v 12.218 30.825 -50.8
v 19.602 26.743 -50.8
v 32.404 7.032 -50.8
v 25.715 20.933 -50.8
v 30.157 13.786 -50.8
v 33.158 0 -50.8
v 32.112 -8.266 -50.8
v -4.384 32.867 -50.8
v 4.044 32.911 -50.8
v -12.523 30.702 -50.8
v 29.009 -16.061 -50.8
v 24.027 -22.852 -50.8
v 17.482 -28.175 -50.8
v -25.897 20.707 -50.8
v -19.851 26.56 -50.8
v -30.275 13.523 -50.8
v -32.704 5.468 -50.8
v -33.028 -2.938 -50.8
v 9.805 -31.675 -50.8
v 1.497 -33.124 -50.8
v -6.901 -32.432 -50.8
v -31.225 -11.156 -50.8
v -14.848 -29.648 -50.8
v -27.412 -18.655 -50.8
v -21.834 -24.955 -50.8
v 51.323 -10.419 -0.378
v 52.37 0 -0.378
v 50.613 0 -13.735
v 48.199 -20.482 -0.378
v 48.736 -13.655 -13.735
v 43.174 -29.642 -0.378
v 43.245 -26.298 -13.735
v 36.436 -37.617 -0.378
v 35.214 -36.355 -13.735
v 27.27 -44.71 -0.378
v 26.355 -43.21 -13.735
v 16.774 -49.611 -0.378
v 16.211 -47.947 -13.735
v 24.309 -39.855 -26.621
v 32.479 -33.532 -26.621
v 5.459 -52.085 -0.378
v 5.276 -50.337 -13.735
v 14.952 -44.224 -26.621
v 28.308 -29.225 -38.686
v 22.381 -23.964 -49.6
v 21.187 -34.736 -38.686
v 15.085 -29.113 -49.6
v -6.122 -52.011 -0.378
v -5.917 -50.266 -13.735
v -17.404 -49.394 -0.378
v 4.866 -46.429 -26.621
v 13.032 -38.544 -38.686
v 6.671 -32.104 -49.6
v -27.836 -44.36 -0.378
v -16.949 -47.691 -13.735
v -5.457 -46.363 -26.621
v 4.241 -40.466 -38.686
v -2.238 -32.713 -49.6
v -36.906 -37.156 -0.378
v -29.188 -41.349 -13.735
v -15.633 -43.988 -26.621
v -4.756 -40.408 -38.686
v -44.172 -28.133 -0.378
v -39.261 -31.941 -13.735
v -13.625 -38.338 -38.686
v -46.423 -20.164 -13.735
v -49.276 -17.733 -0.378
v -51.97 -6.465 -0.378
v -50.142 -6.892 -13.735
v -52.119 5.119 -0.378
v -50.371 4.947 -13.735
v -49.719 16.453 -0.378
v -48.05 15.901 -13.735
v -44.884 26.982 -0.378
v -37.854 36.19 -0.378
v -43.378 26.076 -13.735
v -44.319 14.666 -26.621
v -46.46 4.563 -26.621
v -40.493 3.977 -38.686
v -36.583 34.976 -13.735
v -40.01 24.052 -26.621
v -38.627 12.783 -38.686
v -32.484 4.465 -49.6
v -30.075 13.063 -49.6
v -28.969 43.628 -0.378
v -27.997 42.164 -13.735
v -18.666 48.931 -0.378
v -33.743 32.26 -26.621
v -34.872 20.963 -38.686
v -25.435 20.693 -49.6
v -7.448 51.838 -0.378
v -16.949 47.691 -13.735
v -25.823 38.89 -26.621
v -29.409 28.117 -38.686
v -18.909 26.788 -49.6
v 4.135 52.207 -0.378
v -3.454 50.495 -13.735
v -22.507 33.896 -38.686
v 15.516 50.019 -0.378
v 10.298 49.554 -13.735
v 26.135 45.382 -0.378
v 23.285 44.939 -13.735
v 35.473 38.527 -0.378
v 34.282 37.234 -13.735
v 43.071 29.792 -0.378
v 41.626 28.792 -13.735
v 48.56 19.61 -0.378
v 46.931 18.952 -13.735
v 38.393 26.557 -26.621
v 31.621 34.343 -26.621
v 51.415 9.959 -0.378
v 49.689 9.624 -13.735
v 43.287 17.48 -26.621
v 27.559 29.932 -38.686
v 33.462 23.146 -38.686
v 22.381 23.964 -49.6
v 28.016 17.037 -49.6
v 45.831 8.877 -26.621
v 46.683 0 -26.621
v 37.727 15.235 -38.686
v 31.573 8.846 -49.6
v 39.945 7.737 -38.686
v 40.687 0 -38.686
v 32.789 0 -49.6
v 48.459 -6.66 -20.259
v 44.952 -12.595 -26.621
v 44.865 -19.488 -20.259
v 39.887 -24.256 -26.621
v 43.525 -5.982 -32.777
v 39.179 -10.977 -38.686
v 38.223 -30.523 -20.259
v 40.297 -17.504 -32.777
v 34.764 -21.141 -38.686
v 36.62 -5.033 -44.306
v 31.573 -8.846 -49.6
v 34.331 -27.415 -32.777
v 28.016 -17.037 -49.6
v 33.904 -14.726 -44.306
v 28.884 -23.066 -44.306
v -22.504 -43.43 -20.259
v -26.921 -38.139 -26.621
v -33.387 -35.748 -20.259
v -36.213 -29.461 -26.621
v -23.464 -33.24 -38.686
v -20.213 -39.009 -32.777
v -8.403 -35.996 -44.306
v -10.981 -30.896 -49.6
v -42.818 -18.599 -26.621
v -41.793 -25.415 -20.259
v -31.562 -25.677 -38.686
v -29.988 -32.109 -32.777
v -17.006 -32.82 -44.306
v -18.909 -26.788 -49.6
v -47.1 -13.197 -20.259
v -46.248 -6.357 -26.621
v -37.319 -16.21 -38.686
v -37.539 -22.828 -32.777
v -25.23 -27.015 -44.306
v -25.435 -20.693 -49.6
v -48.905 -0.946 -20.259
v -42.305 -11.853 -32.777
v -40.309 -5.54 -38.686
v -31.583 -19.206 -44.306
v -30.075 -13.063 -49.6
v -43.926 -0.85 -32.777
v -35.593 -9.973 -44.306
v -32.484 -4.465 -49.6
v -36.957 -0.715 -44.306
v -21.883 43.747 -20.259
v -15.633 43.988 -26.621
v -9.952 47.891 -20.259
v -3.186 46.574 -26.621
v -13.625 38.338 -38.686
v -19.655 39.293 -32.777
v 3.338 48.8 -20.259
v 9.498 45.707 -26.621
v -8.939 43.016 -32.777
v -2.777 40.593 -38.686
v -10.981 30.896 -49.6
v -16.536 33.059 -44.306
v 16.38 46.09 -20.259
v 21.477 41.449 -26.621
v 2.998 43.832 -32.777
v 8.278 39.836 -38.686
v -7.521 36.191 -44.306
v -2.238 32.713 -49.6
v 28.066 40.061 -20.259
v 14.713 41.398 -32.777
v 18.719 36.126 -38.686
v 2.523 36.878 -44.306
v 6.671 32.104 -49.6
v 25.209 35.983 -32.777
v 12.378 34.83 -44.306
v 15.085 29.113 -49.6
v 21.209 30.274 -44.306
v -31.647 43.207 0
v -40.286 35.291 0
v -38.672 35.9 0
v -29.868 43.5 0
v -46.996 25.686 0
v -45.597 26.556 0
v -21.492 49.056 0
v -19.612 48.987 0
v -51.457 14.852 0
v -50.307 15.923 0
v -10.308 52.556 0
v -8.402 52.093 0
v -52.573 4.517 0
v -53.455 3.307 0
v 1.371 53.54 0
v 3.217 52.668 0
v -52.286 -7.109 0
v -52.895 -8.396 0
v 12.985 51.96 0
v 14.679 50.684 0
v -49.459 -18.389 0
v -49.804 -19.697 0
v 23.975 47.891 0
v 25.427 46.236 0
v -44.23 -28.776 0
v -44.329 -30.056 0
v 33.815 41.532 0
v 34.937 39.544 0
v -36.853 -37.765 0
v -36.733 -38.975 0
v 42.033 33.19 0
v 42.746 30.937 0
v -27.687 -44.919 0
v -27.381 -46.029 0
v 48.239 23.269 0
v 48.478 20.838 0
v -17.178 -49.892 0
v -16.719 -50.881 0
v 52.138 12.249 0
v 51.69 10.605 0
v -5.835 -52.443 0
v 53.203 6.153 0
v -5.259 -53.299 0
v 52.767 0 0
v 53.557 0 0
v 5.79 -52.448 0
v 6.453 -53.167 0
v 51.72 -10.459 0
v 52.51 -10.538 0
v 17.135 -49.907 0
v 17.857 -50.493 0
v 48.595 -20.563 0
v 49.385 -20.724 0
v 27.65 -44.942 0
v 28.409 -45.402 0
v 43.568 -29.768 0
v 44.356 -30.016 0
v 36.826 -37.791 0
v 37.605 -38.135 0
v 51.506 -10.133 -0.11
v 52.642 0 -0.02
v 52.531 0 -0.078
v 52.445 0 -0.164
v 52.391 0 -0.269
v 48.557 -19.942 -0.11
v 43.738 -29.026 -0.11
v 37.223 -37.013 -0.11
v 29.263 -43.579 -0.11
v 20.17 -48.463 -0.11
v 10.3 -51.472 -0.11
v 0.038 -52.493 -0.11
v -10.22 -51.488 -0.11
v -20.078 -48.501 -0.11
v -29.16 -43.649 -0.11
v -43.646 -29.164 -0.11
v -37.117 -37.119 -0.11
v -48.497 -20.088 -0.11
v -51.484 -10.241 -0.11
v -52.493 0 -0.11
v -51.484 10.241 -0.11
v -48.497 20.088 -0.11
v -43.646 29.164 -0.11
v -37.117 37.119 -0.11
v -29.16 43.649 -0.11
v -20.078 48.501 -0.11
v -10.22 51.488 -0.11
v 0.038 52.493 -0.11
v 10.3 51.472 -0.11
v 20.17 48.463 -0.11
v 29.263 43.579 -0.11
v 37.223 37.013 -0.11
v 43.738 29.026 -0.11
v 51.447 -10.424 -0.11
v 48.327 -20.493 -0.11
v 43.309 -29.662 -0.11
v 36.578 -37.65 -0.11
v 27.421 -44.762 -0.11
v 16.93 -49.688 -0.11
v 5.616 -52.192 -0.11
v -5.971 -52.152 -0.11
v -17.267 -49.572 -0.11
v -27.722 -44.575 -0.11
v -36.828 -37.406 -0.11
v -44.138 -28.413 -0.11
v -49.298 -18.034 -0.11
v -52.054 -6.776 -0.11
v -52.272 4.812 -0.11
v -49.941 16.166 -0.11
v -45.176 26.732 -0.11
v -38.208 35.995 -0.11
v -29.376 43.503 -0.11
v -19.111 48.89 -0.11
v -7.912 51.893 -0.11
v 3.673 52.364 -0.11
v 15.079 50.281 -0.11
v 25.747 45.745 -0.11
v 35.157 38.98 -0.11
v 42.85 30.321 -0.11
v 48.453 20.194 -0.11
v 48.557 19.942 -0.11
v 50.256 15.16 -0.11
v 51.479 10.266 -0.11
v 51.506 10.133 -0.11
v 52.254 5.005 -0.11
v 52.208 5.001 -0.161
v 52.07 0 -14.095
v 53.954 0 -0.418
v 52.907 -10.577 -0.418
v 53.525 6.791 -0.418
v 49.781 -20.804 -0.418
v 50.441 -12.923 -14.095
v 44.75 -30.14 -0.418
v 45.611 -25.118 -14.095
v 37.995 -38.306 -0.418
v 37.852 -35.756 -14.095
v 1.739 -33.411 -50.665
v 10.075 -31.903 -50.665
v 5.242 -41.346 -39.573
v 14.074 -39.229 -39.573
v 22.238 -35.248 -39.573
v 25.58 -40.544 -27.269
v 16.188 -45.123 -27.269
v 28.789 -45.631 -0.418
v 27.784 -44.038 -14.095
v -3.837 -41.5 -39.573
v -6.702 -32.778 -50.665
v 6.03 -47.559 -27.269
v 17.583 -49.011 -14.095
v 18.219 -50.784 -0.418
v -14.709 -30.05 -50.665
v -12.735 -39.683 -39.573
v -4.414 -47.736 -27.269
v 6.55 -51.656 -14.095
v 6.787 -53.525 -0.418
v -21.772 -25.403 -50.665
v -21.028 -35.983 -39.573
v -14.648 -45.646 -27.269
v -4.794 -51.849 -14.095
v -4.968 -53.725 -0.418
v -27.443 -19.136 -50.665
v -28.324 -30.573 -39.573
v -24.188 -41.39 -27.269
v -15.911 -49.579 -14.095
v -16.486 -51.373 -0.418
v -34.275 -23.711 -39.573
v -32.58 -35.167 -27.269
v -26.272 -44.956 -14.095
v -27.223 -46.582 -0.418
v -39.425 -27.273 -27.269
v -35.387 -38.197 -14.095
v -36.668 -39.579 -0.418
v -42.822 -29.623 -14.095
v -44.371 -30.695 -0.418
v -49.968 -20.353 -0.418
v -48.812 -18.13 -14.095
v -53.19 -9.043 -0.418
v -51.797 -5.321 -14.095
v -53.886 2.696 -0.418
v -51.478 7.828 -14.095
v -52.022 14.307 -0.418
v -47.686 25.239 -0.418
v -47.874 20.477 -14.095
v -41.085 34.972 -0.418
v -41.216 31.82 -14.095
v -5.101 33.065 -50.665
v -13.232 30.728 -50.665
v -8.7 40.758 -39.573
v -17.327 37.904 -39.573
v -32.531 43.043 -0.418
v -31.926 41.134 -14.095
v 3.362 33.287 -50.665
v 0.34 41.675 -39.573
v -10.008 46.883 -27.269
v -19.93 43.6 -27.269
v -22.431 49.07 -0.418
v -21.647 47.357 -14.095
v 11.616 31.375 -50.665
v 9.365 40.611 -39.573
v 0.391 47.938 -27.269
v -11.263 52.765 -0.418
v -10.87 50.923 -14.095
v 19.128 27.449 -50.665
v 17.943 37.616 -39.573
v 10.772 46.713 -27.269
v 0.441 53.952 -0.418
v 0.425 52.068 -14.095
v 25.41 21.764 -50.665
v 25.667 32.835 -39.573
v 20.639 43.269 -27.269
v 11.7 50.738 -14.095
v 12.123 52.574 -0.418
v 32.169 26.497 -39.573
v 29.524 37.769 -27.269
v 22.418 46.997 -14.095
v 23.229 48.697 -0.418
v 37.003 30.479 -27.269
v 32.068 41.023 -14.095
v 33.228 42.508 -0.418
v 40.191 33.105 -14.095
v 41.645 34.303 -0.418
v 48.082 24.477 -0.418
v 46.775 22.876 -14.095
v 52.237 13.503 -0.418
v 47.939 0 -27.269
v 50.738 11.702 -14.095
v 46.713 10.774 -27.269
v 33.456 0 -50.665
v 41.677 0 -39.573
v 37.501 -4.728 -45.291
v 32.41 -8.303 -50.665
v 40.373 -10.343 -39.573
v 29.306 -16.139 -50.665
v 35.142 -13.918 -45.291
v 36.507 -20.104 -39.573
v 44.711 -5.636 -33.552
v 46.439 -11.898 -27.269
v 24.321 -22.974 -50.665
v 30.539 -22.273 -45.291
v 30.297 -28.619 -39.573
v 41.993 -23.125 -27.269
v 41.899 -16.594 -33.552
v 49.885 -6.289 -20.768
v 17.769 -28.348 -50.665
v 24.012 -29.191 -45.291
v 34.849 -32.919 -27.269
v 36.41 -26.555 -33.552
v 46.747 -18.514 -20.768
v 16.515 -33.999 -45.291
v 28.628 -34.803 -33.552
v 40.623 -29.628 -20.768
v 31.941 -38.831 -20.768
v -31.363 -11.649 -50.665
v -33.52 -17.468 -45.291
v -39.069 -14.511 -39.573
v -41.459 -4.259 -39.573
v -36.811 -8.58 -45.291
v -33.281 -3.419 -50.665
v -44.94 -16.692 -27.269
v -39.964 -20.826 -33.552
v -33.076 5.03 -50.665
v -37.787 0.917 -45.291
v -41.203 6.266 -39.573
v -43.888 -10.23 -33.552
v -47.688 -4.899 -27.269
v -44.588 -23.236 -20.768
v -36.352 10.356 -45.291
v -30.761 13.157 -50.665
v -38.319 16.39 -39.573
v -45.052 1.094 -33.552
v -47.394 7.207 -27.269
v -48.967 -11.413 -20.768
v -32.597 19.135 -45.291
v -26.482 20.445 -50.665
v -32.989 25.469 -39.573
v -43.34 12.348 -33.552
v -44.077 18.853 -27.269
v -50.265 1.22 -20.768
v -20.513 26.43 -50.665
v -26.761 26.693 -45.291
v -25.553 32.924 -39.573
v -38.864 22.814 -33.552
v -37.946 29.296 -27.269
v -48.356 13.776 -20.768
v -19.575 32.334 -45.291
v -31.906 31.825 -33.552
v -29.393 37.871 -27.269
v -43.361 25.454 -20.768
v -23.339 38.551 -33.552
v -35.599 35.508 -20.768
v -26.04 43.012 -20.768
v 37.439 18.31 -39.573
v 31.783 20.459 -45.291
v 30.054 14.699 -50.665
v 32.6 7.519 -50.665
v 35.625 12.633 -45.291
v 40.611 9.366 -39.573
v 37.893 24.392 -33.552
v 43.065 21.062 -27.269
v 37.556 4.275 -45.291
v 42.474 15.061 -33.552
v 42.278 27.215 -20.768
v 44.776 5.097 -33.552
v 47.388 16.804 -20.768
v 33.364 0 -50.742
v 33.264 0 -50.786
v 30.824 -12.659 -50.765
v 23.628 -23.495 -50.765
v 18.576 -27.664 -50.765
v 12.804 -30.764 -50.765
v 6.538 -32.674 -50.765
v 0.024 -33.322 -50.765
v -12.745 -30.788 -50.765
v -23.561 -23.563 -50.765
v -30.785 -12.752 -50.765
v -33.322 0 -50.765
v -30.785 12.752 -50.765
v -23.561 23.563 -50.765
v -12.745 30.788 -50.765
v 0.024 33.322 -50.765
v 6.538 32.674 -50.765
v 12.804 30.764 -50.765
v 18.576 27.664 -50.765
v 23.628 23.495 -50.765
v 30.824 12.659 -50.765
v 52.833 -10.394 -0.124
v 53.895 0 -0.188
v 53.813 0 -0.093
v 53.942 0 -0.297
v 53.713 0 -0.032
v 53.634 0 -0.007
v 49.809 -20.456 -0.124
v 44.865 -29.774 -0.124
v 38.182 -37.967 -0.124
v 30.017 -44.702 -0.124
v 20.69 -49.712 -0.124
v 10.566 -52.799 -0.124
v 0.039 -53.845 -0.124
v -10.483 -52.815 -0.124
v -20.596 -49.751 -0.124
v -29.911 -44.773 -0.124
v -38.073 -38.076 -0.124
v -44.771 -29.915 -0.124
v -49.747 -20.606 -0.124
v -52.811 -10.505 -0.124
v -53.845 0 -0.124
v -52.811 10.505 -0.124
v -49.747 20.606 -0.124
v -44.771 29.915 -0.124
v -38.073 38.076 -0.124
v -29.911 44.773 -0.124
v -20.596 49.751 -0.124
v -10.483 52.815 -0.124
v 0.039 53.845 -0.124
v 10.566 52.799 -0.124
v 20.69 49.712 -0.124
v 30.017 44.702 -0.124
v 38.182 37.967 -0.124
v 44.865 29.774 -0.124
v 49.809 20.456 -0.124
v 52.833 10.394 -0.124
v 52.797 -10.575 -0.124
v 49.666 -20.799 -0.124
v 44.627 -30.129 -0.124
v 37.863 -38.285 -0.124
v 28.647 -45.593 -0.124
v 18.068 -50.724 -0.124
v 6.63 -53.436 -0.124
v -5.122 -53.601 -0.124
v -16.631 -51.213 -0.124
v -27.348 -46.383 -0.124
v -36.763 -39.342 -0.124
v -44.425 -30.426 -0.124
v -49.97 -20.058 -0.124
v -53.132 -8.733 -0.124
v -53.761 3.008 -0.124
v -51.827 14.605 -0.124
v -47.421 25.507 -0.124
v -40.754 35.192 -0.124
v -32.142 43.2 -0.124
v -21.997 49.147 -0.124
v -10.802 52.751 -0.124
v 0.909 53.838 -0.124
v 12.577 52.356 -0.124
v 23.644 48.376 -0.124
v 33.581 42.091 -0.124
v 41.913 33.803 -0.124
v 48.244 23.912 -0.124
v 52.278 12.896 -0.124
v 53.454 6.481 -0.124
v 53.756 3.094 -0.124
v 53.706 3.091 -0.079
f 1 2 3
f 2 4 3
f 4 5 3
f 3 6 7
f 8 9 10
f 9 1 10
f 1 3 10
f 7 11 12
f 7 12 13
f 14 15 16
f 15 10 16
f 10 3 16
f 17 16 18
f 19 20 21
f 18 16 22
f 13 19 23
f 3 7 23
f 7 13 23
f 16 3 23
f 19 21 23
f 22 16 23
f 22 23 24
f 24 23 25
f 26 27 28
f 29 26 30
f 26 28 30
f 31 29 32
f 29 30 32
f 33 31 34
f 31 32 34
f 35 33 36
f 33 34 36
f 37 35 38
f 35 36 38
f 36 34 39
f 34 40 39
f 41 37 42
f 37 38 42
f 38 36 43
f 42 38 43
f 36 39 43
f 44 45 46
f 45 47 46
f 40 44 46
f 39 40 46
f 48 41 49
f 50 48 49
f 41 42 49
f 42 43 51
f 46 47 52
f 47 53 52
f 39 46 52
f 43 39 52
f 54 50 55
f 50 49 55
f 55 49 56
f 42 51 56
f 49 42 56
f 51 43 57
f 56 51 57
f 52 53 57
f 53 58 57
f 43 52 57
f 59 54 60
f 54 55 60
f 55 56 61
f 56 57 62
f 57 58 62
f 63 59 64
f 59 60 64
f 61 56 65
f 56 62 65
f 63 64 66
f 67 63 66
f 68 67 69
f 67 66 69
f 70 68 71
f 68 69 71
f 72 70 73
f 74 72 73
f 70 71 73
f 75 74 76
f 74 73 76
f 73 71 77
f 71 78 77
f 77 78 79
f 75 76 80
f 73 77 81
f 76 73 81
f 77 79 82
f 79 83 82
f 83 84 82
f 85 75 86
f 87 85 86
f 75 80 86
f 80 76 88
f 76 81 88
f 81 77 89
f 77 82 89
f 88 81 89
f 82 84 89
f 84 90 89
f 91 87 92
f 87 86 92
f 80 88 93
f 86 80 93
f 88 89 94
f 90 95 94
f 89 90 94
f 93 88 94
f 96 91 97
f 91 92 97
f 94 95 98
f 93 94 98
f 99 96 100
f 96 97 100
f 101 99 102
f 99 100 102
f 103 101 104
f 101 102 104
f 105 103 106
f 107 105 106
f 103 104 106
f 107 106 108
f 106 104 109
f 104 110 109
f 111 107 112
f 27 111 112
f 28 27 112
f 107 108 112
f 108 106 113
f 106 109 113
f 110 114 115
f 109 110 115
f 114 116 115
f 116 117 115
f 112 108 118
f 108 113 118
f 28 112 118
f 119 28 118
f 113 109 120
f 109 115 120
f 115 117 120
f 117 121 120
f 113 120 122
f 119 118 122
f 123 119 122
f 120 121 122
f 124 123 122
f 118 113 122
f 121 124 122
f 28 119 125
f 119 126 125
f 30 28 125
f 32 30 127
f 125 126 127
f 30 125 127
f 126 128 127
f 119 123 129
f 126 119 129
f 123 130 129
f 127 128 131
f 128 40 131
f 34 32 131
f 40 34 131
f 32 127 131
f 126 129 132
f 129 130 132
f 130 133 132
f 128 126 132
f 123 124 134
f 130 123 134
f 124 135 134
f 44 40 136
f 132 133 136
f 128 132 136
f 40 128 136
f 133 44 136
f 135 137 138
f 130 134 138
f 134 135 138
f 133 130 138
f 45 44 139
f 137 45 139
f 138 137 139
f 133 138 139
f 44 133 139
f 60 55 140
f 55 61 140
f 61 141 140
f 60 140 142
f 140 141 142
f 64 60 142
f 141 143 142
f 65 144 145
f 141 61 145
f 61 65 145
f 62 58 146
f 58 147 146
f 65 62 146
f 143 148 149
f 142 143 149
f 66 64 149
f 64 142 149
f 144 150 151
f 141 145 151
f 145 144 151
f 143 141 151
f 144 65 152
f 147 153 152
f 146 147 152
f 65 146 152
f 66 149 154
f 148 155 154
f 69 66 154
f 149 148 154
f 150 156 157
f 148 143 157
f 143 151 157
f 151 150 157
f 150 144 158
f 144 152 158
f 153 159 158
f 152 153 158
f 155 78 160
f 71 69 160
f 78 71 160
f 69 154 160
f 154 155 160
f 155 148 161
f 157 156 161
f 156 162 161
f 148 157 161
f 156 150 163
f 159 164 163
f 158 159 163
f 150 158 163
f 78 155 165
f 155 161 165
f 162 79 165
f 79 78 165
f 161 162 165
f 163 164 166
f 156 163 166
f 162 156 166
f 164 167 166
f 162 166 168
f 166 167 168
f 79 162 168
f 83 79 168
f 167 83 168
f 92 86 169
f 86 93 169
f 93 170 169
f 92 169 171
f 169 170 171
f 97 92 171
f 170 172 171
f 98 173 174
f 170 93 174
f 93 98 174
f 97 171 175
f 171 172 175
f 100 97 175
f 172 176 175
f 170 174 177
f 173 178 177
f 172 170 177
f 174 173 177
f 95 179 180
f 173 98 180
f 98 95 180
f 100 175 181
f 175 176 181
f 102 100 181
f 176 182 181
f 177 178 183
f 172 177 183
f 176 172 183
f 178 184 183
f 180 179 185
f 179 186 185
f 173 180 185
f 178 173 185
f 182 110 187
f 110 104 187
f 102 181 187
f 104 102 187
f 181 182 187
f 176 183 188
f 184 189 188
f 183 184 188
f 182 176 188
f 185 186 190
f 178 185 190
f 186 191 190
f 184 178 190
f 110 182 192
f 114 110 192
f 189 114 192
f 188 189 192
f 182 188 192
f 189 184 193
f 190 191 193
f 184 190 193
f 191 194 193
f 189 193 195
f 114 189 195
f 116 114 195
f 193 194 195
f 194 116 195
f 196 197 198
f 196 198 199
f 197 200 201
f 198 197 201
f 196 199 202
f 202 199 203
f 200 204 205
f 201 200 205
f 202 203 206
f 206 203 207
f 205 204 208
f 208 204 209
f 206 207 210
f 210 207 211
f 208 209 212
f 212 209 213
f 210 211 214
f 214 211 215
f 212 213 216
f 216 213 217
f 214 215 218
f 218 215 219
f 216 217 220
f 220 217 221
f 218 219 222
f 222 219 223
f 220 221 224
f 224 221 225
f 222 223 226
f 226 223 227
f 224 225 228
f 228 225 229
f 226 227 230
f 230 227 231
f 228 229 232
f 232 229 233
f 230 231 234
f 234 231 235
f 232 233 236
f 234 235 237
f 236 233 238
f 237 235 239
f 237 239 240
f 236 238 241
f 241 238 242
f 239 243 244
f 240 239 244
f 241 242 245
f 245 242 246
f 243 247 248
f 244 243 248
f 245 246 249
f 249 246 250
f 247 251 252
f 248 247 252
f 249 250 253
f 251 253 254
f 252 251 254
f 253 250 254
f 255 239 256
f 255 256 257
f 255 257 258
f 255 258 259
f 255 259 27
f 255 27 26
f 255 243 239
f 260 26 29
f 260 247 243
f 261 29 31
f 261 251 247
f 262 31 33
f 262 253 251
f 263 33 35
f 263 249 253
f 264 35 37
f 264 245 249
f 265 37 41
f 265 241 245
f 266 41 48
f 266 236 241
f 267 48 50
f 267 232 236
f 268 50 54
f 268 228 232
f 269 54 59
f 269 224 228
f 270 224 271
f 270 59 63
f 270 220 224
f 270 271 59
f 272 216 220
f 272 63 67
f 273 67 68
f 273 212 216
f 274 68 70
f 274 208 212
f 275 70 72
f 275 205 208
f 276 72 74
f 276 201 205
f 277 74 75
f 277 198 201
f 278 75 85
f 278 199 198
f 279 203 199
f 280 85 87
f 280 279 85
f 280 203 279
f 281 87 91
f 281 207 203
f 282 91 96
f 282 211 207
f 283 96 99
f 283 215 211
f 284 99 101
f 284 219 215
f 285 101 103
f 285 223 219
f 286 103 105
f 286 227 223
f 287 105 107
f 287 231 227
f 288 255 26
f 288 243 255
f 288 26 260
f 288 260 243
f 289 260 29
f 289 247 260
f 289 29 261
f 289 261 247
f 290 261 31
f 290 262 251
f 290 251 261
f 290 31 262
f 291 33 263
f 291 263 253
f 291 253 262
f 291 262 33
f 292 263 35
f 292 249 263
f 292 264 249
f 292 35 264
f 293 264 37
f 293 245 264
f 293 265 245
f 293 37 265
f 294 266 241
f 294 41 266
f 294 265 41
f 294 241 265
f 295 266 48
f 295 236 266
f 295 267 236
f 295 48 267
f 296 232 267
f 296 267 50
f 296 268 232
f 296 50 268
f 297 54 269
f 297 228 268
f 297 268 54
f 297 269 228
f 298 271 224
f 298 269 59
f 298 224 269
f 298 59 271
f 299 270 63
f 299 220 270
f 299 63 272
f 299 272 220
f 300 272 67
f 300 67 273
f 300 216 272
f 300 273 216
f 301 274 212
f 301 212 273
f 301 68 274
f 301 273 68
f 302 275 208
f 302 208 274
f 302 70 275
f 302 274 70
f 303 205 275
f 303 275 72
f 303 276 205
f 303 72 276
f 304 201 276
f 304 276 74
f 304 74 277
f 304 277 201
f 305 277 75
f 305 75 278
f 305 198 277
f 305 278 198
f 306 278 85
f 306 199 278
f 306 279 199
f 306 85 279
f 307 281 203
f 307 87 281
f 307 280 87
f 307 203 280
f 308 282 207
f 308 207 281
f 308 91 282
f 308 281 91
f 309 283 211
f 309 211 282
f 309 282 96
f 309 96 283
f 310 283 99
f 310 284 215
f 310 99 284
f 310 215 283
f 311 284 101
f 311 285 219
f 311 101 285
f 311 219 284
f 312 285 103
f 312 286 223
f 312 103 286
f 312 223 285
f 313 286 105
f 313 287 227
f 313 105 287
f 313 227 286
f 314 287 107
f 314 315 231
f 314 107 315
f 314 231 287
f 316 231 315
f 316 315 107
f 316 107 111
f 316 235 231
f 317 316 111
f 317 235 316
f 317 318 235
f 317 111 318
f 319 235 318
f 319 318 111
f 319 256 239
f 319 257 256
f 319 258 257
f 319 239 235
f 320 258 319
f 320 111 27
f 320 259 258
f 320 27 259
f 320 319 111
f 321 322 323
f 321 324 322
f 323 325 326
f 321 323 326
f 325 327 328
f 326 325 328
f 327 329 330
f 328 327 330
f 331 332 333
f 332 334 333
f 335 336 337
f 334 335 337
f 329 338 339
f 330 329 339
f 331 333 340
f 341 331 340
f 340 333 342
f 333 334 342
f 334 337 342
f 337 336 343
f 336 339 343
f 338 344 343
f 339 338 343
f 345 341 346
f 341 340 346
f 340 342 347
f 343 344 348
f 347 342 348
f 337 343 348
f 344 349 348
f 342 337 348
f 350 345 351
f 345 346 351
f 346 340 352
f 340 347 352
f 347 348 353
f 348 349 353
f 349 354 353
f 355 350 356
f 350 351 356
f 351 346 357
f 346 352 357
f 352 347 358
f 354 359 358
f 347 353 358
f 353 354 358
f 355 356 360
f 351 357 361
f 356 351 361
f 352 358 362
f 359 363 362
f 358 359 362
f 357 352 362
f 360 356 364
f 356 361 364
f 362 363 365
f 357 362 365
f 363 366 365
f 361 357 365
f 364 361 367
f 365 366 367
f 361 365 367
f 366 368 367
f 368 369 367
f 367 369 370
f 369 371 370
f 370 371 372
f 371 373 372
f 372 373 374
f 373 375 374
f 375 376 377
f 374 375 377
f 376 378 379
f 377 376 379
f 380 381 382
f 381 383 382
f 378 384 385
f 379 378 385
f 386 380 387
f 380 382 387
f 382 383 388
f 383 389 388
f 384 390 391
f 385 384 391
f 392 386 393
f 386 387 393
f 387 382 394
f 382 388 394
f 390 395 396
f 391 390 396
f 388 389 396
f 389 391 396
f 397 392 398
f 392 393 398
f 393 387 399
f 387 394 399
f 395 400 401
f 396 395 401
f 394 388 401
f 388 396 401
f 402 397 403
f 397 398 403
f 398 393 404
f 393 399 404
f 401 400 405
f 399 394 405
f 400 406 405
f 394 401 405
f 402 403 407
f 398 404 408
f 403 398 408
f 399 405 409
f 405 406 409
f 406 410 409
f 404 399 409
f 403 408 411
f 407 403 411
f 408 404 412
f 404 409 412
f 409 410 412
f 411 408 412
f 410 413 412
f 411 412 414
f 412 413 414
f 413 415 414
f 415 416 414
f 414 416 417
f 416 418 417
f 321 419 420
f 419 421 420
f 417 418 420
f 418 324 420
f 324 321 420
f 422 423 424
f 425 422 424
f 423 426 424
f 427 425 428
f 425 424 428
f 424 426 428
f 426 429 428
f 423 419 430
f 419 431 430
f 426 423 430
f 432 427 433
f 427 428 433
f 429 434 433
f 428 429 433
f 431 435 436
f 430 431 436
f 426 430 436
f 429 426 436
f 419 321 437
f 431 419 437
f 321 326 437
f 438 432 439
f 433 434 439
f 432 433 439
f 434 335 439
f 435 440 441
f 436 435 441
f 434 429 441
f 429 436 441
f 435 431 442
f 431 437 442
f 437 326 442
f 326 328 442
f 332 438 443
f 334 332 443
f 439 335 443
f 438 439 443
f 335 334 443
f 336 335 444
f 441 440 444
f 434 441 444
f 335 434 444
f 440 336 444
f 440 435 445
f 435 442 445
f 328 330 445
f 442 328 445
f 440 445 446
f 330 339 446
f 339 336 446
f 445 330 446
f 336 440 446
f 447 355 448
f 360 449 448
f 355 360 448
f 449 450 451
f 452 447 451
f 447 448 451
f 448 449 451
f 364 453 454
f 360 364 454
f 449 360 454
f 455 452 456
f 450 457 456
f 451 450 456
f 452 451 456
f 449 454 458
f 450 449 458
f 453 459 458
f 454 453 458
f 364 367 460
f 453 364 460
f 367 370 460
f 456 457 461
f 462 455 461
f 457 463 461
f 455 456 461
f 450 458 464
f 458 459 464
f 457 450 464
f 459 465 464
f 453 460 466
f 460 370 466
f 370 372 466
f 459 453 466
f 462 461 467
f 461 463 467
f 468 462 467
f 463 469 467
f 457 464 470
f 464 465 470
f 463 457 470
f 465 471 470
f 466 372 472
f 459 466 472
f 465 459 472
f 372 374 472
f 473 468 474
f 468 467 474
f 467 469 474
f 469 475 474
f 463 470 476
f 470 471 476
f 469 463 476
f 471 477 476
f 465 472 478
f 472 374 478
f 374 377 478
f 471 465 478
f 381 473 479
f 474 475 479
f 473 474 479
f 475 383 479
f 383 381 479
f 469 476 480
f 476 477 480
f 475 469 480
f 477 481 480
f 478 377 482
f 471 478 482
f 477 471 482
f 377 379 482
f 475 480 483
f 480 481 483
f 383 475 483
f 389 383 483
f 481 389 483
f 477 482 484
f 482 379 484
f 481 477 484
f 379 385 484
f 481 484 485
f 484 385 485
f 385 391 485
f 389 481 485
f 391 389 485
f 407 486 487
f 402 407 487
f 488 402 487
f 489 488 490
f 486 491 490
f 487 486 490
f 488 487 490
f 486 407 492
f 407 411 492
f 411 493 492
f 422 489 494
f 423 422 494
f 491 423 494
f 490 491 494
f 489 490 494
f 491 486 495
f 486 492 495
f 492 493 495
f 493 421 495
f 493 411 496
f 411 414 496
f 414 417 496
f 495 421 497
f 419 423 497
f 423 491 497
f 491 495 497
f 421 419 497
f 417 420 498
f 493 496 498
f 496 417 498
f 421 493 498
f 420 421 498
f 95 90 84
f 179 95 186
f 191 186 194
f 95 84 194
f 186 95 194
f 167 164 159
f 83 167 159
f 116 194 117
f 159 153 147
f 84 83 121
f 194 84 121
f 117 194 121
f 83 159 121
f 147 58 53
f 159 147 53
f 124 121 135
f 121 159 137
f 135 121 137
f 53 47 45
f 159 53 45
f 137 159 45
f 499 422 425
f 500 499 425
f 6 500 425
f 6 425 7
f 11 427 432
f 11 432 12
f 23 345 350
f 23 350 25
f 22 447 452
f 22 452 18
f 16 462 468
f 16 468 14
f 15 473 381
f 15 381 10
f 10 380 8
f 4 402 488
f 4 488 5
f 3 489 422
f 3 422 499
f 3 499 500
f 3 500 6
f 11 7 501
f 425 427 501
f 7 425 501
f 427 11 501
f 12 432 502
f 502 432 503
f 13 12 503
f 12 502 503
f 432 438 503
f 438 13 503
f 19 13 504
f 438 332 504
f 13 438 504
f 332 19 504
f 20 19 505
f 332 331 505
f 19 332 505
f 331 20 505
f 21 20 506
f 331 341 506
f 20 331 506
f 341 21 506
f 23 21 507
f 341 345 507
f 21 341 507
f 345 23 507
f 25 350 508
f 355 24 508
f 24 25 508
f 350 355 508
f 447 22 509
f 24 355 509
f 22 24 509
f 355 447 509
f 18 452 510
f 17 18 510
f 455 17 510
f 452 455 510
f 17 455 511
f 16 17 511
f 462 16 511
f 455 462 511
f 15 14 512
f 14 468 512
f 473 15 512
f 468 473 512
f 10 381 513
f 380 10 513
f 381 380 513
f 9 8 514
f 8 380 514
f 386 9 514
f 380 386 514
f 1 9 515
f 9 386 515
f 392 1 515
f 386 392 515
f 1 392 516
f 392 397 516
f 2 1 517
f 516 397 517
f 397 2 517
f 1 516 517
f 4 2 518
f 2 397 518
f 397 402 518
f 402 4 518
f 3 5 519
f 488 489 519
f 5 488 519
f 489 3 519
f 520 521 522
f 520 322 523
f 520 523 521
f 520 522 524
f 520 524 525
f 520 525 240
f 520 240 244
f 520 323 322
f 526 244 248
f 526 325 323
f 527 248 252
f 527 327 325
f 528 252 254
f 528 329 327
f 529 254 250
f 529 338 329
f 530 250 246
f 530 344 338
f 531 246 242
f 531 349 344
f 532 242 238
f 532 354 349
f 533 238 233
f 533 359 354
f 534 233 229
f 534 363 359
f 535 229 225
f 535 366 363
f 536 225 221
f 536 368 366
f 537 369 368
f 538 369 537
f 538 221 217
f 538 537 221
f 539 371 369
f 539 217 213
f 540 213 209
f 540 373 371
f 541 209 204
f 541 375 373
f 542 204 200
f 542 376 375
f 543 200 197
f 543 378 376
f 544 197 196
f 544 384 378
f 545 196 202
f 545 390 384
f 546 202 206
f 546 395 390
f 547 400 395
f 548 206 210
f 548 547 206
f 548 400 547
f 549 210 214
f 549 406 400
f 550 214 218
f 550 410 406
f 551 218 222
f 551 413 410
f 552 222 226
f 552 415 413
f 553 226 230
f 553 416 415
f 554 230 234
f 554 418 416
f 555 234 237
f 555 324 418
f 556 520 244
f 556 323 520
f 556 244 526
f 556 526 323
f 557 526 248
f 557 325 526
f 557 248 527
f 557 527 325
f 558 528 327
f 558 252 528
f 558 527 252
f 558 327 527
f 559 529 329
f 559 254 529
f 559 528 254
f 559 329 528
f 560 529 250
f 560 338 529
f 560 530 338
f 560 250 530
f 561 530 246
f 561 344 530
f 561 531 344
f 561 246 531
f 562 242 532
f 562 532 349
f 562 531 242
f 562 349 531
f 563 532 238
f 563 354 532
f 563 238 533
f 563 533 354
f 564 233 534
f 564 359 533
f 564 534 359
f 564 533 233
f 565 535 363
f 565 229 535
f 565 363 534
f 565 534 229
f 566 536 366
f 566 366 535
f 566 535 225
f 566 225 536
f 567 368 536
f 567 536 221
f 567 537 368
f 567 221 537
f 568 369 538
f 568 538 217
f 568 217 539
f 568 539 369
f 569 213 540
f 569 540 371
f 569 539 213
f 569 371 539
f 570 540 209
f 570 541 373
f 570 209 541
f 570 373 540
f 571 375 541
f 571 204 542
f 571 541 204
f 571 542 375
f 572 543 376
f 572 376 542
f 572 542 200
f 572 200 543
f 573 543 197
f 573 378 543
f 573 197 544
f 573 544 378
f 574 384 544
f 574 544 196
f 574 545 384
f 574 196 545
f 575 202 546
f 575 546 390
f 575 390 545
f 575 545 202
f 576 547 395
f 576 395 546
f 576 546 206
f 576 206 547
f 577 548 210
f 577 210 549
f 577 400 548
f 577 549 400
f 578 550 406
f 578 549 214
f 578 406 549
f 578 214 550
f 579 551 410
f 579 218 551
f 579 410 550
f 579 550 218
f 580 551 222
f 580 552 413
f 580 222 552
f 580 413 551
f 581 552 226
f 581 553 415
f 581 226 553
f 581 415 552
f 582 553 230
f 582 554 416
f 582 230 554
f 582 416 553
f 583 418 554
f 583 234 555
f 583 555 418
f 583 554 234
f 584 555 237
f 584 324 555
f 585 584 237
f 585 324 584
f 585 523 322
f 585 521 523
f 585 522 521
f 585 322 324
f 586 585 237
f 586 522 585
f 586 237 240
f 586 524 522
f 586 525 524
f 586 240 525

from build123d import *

# Parameters (mm, degrees)
F2_R = 0.396875
F3_R = 0.396875
F4_R = 0.396875


with BuildPart() as f1:
    # F0 (on Front) → F1 (revolve)
    with BuildSketch(Plane.XZ):
        with BuildLine():
            Line((32.789406, -49.600087), (0, -49.600087))
            Line((0, -49.600087), (0, -50.8))
            Line((0, -50.8), (33.3375, -50.8))
            ThreePointArc((33.3375, -50.8), (47.984298, -27.15827), (53.975, 0))
            Line((53.975, 0), (52.3875, 0))
            ThreePointArc((52.3875, 0), (46.752774, -26.445459), (32.789406, -49.600087))
        make_face()
    revolve(axis=Axis((0, 0, -25.4), (0, 0, -1)))

    # F2
    f2_edges = [f1.edges().sort_by_distance(p)[0] for p in [
        (-53.975, 0, 0),
    ]]
    fillet(f2_edges, radius=F2_R)

    # F3
    f3_edges = [f1.edges().sort_by_distance(p)[0] for p in [
        (-52.3875, 0, 0),
    ]]
    fillet(f3_edges, radius=F3_R)

    # F4
    f4_edges = [f1.edges().sort_by_distance(p)[0] for p in [
        (-33.3375, 0, -50.8),
    ]]
    fillet(f4_edges, radius=F4_R)


solid = f1.part
